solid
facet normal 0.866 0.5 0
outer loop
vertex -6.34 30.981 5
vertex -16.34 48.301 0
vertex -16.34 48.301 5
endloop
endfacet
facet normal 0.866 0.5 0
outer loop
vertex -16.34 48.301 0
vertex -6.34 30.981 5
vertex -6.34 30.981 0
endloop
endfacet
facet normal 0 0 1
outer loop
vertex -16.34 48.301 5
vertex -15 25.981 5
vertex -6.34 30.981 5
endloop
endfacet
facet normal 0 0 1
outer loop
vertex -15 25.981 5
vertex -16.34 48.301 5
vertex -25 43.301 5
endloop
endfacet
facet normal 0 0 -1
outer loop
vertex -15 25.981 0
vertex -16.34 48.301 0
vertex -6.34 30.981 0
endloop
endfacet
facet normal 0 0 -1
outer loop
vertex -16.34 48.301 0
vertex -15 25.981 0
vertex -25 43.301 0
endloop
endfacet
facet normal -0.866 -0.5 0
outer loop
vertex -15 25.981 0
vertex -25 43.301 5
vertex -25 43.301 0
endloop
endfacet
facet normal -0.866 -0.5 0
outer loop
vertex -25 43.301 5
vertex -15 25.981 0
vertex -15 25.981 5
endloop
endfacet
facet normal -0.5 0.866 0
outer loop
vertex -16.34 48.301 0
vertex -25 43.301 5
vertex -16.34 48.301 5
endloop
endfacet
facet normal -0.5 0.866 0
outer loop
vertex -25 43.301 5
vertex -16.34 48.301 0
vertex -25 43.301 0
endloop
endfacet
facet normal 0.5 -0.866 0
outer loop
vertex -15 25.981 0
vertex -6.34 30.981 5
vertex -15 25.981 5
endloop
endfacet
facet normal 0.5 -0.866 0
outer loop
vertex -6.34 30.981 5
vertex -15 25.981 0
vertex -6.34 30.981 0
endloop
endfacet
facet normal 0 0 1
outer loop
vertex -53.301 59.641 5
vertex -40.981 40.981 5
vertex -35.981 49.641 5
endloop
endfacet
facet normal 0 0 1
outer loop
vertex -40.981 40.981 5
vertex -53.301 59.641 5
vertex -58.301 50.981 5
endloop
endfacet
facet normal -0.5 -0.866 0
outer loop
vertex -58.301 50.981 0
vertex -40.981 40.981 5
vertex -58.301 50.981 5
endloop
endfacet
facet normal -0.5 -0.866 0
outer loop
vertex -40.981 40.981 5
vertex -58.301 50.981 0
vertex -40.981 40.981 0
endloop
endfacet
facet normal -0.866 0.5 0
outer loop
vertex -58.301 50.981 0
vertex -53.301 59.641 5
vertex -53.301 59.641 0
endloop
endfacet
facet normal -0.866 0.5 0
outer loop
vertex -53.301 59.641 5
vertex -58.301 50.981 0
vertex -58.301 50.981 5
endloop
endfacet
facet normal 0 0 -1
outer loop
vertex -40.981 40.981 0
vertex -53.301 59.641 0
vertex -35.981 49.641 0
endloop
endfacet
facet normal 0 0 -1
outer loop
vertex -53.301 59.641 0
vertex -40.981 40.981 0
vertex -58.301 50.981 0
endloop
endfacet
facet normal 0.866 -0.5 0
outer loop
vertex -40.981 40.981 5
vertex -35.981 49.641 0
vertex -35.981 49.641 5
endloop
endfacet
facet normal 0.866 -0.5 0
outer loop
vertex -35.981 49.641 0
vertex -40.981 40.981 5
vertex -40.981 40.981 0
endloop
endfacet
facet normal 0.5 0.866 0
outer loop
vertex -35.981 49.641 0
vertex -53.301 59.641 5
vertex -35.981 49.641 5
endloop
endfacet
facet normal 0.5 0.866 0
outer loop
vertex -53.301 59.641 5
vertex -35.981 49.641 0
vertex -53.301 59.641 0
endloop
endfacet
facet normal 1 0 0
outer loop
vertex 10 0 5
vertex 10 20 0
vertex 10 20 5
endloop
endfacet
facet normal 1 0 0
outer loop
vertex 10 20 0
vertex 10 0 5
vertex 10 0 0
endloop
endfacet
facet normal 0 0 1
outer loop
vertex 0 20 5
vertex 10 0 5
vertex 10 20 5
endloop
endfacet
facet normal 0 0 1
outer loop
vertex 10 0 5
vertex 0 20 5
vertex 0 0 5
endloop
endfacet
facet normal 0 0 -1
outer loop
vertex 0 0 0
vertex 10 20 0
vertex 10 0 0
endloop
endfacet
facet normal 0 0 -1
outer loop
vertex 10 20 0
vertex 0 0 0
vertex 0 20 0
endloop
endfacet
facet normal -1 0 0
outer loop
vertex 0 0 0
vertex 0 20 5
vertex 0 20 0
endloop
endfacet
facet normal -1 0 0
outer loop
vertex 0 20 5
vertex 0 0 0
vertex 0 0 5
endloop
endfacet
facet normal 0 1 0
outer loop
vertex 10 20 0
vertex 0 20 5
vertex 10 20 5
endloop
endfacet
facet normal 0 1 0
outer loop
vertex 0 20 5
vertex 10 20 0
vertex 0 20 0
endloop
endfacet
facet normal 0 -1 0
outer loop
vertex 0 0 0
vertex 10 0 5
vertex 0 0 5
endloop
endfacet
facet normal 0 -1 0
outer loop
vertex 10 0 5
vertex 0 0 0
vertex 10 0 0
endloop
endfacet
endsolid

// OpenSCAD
union()
{
    cube([10,20,5]);
    rotate(30)
        translate([0,30,0])
	{
	    cube([10,20,5]);
	    rotate(30)
		translate([0,30,0])
		{
		    cube([10,20,5]);
		}
	}
}
